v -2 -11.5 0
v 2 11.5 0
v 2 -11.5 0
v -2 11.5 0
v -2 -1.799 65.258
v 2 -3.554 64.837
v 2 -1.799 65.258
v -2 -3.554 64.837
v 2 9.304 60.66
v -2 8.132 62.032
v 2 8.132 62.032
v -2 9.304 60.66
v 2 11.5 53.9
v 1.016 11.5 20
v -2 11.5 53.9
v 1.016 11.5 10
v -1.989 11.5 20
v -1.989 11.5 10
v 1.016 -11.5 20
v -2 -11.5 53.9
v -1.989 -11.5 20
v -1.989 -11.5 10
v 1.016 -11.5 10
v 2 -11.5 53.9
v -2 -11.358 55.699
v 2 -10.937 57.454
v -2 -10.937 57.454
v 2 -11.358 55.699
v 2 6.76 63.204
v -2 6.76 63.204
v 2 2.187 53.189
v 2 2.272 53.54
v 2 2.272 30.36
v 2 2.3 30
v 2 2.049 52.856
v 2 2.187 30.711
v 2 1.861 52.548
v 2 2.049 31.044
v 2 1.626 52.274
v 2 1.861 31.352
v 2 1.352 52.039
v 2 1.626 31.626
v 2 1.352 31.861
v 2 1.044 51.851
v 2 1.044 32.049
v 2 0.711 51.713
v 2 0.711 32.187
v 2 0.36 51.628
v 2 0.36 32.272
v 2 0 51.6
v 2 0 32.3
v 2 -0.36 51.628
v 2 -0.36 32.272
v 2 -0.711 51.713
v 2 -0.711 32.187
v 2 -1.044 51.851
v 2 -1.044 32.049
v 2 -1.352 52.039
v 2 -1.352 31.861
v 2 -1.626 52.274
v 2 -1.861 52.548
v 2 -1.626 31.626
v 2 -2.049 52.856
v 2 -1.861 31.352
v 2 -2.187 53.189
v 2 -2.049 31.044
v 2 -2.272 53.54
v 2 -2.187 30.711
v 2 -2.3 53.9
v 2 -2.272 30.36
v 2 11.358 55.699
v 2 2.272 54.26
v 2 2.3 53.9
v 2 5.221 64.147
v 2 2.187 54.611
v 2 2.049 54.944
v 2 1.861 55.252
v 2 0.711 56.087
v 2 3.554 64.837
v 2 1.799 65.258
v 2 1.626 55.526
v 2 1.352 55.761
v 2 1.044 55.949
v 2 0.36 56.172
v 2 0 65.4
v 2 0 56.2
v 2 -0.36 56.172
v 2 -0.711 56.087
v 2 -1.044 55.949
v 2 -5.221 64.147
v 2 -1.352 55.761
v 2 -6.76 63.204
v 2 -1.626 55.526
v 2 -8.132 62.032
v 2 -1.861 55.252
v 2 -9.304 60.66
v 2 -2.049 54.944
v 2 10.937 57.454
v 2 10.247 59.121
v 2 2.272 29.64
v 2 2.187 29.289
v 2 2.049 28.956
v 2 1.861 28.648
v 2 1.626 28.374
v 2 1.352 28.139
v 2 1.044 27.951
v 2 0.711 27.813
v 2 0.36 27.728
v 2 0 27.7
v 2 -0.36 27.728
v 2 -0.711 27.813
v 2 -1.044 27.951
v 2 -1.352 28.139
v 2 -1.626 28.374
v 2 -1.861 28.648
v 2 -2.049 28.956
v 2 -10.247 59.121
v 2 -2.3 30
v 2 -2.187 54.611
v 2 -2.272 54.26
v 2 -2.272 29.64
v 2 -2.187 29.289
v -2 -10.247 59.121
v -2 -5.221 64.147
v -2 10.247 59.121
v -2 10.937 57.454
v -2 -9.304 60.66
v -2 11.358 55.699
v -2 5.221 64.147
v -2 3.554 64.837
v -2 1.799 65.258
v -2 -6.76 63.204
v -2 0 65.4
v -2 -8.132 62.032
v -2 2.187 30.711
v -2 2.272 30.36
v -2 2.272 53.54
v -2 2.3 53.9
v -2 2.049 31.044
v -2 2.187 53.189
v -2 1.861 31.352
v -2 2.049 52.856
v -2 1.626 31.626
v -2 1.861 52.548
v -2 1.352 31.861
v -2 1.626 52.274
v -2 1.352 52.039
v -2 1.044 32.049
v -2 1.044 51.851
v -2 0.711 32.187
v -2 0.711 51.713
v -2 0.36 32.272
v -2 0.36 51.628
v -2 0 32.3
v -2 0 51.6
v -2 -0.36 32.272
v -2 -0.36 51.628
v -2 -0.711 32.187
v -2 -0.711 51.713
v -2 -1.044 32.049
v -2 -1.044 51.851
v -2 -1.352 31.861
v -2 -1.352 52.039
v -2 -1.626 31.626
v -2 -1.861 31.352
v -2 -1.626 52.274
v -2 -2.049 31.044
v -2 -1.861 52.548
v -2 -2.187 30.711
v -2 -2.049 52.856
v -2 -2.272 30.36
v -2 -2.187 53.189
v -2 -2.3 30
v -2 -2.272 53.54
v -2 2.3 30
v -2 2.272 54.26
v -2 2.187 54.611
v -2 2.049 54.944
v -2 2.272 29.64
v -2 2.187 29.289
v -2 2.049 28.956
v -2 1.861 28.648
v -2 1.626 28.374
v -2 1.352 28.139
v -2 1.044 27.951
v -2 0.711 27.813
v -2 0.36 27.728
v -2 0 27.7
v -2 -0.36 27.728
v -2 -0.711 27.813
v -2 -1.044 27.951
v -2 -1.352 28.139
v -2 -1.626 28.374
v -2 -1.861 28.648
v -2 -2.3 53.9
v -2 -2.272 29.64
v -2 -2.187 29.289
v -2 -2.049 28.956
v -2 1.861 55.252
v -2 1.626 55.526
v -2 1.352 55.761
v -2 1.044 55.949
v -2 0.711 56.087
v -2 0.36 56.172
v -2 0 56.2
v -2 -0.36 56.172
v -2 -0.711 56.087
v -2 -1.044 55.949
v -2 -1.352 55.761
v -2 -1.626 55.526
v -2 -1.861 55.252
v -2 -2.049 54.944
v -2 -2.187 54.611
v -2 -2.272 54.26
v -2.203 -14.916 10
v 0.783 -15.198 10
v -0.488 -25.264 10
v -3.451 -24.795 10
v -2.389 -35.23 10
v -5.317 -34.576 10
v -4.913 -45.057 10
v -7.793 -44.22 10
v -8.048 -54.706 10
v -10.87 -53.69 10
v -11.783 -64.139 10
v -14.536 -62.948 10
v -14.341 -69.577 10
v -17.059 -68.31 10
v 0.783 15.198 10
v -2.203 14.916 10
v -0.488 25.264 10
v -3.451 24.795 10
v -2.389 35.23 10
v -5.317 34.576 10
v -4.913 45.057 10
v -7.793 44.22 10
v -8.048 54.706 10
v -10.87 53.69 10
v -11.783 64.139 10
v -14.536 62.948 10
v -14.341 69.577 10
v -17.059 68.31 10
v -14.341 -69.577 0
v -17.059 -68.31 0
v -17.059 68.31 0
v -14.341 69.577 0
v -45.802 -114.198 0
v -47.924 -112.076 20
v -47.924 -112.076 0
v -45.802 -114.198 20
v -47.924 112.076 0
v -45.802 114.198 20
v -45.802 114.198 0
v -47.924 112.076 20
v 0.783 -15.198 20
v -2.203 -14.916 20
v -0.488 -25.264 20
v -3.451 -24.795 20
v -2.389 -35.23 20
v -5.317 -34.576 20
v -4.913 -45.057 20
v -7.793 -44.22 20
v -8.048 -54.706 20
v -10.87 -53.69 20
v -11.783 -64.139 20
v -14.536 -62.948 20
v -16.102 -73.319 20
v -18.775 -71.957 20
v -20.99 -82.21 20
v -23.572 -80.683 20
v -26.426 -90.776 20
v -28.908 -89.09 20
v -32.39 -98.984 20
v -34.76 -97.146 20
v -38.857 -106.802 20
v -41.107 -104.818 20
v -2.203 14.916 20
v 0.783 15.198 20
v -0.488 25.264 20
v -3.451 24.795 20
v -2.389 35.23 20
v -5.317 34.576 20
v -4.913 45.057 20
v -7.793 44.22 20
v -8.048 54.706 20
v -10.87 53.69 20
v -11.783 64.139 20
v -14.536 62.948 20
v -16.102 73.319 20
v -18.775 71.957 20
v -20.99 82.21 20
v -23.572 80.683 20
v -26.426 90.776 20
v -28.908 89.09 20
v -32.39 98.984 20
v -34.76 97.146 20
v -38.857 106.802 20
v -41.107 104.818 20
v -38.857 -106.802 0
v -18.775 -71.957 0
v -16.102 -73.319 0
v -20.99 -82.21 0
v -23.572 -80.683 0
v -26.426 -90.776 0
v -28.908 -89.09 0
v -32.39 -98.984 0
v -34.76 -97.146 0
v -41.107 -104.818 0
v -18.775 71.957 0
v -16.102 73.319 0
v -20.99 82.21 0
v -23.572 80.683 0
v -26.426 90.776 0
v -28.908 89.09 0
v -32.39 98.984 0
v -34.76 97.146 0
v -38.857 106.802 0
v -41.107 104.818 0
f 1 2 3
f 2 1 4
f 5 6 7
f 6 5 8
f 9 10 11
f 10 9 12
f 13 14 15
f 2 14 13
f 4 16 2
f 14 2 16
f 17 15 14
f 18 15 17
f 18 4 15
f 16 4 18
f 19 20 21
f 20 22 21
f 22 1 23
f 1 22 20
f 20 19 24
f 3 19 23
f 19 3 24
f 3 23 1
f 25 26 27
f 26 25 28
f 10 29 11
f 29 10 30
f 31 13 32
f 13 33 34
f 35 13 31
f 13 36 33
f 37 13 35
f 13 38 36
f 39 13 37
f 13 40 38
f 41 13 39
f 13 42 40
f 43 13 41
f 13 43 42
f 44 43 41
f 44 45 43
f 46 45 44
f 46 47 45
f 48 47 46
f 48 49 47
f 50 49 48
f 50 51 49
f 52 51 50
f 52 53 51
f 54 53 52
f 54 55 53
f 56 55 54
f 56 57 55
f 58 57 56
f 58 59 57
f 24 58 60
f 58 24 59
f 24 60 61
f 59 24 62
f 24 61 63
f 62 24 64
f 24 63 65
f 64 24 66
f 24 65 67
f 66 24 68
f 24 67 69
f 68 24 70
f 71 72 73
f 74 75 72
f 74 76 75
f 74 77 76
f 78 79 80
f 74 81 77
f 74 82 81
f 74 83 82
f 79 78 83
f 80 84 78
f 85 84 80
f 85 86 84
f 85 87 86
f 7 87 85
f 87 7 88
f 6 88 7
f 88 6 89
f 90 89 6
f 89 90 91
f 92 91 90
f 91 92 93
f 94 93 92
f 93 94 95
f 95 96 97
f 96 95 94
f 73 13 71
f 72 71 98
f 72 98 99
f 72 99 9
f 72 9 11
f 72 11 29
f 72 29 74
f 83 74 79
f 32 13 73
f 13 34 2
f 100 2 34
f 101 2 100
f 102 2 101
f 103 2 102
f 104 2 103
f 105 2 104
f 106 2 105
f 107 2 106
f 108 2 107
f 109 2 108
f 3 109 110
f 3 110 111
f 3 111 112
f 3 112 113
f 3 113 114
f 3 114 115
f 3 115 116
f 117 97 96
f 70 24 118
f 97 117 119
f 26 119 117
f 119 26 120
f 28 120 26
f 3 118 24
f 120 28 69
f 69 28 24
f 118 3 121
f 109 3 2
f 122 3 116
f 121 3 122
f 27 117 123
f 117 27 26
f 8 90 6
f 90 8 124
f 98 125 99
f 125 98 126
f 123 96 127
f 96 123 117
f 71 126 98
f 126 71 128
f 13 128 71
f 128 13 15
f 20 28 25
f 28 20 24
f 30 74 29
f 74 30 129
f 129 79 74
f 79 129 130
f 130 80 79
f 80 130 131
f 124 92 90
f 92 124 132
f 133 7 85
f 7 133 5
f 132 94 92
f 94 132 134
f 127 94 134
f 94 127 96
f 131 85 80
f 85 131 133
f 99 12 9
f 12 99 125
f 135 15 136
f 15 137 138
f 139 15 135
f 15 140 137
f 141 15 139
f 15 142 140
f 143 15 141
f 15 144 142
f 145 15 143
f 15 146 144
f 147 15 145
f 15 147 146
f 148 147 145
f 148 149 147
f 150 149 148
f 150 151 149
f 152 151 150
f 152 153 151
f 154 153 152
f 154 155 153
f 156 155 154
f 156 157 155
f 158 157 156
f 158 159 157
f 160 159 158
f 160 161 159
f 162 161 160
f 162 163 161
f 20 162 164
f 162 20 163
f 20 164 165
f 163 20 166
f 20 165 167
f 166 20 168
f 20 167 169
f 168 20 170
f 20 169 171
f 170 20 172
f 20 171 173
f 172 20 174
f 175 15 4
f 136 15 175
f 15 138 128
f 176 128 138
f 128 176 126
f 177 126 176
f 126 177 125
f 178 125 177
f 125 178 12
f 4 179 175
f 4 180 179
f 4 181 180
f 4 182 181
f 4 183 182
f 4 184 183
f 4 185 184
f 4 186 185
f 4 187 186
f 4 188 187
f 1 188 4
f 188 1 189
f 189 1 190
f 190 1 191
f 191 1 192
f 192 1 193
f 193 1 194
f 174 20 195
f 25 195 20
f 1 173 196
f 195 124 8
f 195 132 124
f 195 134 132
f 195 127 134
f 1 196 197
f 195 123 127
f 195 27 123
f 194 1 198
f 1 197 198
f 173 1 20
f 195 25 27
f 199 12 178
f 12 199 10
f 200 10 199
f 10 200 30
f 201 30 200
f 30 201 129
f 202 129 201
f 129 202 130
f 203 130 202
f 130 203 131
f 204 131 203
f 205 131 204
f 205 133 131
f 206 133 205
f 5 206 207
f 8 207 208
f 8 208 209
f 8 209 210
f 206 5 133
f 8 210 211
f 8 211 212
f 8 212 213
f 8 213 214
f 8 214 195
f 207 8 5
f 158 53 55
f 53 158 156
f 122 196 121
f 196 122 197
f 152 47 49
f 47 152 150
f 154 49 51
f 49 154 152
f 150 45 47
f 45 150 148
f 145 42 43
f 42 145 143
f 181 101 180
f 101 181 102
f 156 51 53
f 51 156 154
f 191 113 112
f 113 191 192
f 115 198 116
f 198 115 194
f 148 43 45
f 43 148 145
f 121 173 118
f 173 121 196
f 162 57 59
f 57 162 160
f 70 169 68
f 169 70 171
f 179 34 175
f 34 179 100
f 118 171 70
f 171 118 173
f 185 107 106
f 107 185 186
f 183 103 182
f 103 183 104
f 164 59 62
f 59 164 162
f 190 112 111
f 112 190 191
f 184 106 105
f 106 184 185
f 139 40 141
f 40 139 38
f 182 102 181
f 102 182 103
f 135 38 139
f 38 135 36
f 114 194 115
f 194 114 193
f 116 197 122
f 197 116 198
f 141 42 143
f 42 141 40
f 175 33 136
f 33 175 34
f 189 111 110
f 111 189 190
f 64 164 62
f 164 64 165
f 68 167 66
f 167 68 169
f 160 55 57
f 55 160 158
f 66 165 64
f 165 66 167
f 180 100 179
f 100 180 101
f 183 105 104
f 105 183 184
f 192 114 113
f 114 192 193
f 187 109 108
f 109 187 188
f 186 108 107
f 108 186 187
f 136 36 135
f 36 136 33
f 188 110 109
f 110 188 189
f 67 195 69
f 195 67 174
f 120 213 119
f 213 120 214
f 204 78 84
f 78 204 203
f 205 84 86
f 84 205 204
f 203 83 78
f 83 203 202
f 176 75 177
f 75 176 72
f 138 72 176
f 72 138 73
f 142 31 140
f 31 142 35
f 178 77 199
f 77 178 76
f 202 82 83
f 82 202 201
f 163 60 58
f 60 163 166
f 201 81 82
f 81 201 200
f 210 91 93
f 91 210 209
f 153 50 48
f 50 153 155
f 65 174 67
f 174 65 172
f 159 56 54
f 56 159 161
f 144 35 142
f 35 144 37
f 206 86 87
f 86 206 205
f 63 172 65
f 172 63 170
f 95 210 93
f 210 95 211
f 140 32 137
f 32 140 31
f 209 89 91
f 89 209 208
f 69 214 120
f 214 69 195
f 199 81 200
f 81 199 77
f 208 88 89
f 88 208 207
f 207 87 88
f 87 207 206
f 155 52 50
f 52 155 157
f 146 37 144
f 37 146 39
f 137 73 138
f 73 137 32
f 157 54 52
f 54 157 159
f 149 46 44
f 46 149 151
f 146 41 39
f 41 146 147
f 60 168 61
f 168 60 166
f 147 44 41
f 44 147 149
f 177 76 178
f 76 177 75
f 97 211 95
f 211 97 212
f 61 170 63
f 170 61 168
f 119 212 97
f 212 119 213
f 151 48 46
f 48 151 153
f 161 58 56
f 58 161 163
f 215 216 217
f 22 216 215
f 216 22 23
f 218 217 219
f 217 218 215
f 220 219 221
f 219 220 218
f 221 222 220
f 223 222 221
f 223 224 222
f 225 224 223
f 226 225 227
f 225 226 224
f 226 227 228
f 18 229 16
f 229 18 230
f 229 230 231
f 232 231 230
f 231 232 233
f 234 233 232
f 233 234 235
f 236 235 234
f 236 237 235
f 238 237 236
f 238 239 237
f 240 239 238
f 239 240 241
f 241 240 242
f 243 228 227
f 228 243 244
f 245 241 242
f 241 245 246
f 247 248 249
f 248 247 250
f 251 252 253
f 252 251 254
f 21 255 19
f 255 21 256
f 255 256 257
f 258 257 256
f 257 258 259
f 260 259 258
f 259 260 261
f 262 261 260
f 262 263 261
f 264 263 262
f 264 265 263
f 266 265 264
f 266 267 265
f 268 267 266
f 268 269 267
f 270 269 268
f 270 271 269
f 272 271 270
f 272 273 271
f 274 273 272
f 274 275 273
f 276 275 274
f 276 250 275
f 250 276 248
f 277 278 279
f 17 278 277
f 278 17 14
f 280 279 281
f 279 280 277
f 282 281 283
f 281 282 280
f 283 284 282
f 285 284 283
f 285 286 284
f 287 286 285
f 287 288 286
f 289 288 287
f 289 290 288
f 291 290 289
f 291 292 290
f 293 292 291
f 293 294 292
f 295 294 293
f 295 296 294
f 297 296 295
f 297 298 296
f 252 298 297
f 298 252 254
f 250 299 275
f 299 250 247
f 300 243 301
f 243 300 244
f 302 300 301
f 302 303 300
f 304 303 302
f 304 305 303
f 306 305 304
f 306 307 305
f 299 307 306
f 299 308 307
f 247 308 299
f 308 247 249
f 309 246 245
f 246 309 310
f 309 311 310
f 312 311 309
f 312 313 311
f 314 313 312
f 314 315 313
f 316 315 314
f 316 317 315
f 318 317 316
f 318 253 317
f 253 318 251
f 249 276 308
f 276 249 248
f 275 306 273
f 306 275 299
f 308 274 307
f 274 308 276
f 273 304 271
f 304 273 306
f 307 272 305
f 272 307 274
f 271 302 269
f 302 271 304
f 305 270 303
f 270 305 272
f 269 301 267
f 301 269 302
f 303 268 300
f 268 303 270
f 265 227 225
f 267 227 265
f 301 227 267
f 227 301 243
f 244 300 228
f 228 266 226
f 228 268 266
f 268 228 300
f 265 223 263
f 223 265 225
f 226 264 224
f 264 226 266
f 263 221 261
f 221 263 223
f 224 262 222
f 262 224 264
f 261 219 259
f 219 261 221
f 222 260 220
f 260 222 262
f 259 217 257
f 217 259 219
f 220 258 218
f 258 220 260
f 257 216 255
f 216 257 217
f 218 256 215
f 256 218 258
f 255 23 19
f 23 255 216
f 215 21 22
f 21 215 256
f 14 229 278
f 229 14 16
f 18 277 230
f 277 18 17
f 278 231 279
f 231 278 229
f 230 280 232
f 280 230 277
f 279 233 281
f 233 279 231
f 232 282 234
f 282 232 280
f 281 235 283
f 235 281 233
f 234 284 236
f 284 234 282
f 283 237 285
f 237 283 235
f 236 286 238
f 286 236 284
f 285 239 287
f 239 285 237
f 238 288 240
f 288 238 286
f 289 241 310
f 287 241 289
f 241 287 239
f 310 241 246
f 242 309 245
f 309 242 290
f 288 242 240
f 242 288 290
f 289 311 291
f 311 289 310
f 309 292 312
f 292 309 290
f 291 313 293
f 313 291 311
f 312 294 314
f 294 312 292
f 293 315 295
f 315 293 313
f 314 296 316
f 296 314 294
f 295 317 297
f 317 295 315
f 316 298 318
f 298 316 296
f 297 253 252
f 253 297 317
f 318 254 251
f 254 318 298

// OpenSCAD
$fn=100;
/*
  Robot Vac Skirt Extender
  For Model: Hoover Performer Plus
  Author: Brian Khuu 2019
  
  This ensures it doesn't go over carpets or doorstops if needed.
  This is mounted via M4 screws in the Hoover Performer Plus.

*/

// Minimum Skirt Enable?
minimum_skirt = false;

// Holes in extended skirt (needs printed support)
skirt_holes = true;

// Hole Dia
hole_dia=4.6;

// Hole Spacing
hole_spacing=28.5-4.6;

// Skirt Length from lower hole
skirt_length=30;

// Thickness
thickness=4;

// Skirt Thickness
thickness_skirt=3;

// Width
width=hole_dia*5;

// radius of bot
bot_radius=160;

// Bottom Skirt Height
bot_skirt_h=20;

module minimum_skirt(rounded_bottom)
{
  translate([skirt_length,0,0])
  difference()
  {
    union()
    {
      hull()
      {
        translate([0,0,0])
          cylinder(d=width, h=thickness, $fn=40, center=true);
        translate([hole_spacing,0,0])
          cylinder(d=width, h=thickness, $fn=40, center=true);
        translate([-skirt_length,0,0])
          cube([0.001,width,thickness], center=true);
        if (rounded_bottom)
          translate([-skirt_length,0,0])
            rotate([90,0,0])
              cylinder(d=thickness, h=width, $fn=40, center=true);
      }
    }
    translate([0,0,0])
      cylinder(d=hole_dia, h=2+thickness, $fn=40, center=true);
    translate([hole_spacing,0,0])
      cylinder(d=hole_dia, h=2+thickness, $fn=40, center=true);
  }
}

module full_skirt()
{
  translate([-bot_radius,0,0])
  union()
  {
    translate([bot_radius,0,0])
      rotate([0,-90,0])
        minimum_skirt(false);
    difference()
    {
      rotate([0,0,-45])
        rotate_extrude(angle=90)
          translate([bot_radius,bot_skirt_h/2,0])
            square([thickness_skirt,bot_skirt_h], center=true);
      
      if (skirt_holes)
      for(xi=[-25:1:25])
        rotate([0,0,xi])
          cube([1000,3,((bot_skirt_h-10)*2)], center=true);
    }
  }
}

if (minimum_skirt)
  minimum_skirt(true);
else
  full_skirt();
